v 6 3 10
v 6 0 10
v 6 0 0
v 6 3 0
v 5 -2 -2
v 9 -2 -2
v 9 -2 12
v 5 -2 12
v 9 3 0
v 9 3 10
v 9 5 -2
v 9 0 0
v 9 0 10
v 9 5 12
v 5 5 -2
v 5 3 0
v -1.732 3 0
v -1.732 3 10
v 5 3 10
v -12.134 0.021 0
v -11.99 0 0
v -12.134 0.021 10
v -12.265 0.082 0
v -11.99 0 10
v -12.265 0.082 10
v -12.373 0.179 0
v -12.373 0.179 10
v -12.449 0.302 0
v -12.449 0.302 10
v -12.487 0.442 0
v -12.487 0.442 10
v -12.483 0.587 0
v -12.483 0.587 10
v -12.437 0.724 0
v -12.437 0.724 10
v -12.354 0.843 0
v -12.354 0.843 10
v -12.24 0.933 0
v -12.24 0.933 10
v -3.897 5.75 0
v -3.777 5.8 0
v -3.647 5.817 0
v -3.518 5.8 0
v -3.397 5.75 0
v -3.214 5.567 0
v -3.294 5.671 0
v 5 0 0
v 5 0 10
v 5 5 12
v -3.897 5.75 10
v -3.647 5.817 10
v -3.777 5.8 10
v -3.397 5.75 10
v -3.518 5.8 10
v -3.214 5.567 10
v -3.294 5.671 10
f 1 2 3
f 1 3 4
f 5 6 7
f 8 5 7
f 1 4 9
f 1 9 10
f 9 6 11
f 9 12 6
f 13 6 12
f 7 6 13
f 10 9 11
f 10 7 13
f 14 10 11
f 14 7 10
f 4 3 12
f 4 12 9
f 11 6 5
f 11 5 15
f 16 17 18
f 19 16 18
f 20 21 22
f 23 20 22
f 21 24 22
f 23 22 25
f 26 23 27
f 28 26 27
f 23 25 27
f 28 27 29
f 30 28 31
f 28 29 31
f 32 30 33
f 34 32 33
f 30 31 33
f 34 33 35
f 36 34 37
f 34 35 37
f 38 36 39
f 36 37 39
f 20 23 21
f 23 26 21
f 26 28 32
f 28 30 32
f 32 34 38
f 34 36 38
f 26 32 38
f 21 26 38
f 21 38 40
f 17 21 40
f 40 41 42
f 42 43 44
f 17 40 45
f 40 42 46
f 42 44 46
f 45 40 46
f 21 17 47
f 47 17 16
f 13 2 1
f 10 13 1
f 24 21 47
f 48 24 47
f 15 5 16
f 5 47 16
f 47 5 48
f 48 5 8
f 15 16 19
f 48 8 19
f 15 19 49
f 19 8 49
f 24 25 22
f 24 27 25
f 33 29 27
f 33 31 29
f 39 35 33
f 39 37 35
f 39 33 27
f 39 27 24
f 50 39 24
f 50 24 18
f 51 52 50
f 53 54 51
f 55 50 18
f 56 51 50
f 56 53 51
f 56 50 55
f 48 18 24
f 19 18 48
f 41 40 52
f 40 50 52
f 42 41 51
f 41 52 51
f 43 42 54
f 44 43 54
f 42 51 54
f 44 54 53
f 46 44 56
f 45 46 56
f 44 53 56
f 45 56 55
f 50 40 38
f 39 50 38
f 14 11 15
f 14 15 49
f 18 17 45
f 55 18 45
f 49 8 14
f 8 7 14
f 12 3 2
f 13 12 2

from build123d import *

# Parameters (mm, degrees)
F1_DEPTH      = 10
F3_W          = 3
F3_H          = 10
F4_DEPTH      = 9.464
F5_W          = 7
F5_H          = 14
F5_W_2        = 3
F5_H_2        = 10
F6_DEPTH      = 3
F6_DEPTH_BACK = 1
F7_R          = 0.5


with BuildPart() as f1:
    # F0 (on Top) → F1 (new body)
    with BuildSketch(Plane.XY):
        Polygon((-13.856406, 0), (0, 0), (-3.464102, 6), align=None)
    extrude(amount=F1_DEPTH)

    # F3 (on offset) → F4 (join)
    with BuildSketch(Plane.YZ.offset(-3.4643)):
        with Locations((1.5, 5)):
            Rectangle(F3_W, F3_H)
    extrude(amount=F4_DEPTH)

    # F5 (on face) → F6 (join, two sides)
    with BuildSketch(Plane.YZ.offset(5.9997)) as f6_sk:
        with Locations((1.5, 5)):
            Rectangle(F5_W, F5_H)
        with Locations((1.5, 5)):
            Rectangle(F5_W_2, F5_H_2, mode=Mode.SUBTRACT)
    extrude(amount=F6_DEPTH)
    extrude(f6_sk.sketch, amount=-F6_DEPTH_BACK)

    # F7
    f7_edges = [f1.edges().sort_by_distance(p)[0] for p in [
        (-13.856406, 0, 5),
        (-3.464102, 6, 5),
    ]]
    fillet(f7_edges, radius=F7_R)


solid = f1.part
